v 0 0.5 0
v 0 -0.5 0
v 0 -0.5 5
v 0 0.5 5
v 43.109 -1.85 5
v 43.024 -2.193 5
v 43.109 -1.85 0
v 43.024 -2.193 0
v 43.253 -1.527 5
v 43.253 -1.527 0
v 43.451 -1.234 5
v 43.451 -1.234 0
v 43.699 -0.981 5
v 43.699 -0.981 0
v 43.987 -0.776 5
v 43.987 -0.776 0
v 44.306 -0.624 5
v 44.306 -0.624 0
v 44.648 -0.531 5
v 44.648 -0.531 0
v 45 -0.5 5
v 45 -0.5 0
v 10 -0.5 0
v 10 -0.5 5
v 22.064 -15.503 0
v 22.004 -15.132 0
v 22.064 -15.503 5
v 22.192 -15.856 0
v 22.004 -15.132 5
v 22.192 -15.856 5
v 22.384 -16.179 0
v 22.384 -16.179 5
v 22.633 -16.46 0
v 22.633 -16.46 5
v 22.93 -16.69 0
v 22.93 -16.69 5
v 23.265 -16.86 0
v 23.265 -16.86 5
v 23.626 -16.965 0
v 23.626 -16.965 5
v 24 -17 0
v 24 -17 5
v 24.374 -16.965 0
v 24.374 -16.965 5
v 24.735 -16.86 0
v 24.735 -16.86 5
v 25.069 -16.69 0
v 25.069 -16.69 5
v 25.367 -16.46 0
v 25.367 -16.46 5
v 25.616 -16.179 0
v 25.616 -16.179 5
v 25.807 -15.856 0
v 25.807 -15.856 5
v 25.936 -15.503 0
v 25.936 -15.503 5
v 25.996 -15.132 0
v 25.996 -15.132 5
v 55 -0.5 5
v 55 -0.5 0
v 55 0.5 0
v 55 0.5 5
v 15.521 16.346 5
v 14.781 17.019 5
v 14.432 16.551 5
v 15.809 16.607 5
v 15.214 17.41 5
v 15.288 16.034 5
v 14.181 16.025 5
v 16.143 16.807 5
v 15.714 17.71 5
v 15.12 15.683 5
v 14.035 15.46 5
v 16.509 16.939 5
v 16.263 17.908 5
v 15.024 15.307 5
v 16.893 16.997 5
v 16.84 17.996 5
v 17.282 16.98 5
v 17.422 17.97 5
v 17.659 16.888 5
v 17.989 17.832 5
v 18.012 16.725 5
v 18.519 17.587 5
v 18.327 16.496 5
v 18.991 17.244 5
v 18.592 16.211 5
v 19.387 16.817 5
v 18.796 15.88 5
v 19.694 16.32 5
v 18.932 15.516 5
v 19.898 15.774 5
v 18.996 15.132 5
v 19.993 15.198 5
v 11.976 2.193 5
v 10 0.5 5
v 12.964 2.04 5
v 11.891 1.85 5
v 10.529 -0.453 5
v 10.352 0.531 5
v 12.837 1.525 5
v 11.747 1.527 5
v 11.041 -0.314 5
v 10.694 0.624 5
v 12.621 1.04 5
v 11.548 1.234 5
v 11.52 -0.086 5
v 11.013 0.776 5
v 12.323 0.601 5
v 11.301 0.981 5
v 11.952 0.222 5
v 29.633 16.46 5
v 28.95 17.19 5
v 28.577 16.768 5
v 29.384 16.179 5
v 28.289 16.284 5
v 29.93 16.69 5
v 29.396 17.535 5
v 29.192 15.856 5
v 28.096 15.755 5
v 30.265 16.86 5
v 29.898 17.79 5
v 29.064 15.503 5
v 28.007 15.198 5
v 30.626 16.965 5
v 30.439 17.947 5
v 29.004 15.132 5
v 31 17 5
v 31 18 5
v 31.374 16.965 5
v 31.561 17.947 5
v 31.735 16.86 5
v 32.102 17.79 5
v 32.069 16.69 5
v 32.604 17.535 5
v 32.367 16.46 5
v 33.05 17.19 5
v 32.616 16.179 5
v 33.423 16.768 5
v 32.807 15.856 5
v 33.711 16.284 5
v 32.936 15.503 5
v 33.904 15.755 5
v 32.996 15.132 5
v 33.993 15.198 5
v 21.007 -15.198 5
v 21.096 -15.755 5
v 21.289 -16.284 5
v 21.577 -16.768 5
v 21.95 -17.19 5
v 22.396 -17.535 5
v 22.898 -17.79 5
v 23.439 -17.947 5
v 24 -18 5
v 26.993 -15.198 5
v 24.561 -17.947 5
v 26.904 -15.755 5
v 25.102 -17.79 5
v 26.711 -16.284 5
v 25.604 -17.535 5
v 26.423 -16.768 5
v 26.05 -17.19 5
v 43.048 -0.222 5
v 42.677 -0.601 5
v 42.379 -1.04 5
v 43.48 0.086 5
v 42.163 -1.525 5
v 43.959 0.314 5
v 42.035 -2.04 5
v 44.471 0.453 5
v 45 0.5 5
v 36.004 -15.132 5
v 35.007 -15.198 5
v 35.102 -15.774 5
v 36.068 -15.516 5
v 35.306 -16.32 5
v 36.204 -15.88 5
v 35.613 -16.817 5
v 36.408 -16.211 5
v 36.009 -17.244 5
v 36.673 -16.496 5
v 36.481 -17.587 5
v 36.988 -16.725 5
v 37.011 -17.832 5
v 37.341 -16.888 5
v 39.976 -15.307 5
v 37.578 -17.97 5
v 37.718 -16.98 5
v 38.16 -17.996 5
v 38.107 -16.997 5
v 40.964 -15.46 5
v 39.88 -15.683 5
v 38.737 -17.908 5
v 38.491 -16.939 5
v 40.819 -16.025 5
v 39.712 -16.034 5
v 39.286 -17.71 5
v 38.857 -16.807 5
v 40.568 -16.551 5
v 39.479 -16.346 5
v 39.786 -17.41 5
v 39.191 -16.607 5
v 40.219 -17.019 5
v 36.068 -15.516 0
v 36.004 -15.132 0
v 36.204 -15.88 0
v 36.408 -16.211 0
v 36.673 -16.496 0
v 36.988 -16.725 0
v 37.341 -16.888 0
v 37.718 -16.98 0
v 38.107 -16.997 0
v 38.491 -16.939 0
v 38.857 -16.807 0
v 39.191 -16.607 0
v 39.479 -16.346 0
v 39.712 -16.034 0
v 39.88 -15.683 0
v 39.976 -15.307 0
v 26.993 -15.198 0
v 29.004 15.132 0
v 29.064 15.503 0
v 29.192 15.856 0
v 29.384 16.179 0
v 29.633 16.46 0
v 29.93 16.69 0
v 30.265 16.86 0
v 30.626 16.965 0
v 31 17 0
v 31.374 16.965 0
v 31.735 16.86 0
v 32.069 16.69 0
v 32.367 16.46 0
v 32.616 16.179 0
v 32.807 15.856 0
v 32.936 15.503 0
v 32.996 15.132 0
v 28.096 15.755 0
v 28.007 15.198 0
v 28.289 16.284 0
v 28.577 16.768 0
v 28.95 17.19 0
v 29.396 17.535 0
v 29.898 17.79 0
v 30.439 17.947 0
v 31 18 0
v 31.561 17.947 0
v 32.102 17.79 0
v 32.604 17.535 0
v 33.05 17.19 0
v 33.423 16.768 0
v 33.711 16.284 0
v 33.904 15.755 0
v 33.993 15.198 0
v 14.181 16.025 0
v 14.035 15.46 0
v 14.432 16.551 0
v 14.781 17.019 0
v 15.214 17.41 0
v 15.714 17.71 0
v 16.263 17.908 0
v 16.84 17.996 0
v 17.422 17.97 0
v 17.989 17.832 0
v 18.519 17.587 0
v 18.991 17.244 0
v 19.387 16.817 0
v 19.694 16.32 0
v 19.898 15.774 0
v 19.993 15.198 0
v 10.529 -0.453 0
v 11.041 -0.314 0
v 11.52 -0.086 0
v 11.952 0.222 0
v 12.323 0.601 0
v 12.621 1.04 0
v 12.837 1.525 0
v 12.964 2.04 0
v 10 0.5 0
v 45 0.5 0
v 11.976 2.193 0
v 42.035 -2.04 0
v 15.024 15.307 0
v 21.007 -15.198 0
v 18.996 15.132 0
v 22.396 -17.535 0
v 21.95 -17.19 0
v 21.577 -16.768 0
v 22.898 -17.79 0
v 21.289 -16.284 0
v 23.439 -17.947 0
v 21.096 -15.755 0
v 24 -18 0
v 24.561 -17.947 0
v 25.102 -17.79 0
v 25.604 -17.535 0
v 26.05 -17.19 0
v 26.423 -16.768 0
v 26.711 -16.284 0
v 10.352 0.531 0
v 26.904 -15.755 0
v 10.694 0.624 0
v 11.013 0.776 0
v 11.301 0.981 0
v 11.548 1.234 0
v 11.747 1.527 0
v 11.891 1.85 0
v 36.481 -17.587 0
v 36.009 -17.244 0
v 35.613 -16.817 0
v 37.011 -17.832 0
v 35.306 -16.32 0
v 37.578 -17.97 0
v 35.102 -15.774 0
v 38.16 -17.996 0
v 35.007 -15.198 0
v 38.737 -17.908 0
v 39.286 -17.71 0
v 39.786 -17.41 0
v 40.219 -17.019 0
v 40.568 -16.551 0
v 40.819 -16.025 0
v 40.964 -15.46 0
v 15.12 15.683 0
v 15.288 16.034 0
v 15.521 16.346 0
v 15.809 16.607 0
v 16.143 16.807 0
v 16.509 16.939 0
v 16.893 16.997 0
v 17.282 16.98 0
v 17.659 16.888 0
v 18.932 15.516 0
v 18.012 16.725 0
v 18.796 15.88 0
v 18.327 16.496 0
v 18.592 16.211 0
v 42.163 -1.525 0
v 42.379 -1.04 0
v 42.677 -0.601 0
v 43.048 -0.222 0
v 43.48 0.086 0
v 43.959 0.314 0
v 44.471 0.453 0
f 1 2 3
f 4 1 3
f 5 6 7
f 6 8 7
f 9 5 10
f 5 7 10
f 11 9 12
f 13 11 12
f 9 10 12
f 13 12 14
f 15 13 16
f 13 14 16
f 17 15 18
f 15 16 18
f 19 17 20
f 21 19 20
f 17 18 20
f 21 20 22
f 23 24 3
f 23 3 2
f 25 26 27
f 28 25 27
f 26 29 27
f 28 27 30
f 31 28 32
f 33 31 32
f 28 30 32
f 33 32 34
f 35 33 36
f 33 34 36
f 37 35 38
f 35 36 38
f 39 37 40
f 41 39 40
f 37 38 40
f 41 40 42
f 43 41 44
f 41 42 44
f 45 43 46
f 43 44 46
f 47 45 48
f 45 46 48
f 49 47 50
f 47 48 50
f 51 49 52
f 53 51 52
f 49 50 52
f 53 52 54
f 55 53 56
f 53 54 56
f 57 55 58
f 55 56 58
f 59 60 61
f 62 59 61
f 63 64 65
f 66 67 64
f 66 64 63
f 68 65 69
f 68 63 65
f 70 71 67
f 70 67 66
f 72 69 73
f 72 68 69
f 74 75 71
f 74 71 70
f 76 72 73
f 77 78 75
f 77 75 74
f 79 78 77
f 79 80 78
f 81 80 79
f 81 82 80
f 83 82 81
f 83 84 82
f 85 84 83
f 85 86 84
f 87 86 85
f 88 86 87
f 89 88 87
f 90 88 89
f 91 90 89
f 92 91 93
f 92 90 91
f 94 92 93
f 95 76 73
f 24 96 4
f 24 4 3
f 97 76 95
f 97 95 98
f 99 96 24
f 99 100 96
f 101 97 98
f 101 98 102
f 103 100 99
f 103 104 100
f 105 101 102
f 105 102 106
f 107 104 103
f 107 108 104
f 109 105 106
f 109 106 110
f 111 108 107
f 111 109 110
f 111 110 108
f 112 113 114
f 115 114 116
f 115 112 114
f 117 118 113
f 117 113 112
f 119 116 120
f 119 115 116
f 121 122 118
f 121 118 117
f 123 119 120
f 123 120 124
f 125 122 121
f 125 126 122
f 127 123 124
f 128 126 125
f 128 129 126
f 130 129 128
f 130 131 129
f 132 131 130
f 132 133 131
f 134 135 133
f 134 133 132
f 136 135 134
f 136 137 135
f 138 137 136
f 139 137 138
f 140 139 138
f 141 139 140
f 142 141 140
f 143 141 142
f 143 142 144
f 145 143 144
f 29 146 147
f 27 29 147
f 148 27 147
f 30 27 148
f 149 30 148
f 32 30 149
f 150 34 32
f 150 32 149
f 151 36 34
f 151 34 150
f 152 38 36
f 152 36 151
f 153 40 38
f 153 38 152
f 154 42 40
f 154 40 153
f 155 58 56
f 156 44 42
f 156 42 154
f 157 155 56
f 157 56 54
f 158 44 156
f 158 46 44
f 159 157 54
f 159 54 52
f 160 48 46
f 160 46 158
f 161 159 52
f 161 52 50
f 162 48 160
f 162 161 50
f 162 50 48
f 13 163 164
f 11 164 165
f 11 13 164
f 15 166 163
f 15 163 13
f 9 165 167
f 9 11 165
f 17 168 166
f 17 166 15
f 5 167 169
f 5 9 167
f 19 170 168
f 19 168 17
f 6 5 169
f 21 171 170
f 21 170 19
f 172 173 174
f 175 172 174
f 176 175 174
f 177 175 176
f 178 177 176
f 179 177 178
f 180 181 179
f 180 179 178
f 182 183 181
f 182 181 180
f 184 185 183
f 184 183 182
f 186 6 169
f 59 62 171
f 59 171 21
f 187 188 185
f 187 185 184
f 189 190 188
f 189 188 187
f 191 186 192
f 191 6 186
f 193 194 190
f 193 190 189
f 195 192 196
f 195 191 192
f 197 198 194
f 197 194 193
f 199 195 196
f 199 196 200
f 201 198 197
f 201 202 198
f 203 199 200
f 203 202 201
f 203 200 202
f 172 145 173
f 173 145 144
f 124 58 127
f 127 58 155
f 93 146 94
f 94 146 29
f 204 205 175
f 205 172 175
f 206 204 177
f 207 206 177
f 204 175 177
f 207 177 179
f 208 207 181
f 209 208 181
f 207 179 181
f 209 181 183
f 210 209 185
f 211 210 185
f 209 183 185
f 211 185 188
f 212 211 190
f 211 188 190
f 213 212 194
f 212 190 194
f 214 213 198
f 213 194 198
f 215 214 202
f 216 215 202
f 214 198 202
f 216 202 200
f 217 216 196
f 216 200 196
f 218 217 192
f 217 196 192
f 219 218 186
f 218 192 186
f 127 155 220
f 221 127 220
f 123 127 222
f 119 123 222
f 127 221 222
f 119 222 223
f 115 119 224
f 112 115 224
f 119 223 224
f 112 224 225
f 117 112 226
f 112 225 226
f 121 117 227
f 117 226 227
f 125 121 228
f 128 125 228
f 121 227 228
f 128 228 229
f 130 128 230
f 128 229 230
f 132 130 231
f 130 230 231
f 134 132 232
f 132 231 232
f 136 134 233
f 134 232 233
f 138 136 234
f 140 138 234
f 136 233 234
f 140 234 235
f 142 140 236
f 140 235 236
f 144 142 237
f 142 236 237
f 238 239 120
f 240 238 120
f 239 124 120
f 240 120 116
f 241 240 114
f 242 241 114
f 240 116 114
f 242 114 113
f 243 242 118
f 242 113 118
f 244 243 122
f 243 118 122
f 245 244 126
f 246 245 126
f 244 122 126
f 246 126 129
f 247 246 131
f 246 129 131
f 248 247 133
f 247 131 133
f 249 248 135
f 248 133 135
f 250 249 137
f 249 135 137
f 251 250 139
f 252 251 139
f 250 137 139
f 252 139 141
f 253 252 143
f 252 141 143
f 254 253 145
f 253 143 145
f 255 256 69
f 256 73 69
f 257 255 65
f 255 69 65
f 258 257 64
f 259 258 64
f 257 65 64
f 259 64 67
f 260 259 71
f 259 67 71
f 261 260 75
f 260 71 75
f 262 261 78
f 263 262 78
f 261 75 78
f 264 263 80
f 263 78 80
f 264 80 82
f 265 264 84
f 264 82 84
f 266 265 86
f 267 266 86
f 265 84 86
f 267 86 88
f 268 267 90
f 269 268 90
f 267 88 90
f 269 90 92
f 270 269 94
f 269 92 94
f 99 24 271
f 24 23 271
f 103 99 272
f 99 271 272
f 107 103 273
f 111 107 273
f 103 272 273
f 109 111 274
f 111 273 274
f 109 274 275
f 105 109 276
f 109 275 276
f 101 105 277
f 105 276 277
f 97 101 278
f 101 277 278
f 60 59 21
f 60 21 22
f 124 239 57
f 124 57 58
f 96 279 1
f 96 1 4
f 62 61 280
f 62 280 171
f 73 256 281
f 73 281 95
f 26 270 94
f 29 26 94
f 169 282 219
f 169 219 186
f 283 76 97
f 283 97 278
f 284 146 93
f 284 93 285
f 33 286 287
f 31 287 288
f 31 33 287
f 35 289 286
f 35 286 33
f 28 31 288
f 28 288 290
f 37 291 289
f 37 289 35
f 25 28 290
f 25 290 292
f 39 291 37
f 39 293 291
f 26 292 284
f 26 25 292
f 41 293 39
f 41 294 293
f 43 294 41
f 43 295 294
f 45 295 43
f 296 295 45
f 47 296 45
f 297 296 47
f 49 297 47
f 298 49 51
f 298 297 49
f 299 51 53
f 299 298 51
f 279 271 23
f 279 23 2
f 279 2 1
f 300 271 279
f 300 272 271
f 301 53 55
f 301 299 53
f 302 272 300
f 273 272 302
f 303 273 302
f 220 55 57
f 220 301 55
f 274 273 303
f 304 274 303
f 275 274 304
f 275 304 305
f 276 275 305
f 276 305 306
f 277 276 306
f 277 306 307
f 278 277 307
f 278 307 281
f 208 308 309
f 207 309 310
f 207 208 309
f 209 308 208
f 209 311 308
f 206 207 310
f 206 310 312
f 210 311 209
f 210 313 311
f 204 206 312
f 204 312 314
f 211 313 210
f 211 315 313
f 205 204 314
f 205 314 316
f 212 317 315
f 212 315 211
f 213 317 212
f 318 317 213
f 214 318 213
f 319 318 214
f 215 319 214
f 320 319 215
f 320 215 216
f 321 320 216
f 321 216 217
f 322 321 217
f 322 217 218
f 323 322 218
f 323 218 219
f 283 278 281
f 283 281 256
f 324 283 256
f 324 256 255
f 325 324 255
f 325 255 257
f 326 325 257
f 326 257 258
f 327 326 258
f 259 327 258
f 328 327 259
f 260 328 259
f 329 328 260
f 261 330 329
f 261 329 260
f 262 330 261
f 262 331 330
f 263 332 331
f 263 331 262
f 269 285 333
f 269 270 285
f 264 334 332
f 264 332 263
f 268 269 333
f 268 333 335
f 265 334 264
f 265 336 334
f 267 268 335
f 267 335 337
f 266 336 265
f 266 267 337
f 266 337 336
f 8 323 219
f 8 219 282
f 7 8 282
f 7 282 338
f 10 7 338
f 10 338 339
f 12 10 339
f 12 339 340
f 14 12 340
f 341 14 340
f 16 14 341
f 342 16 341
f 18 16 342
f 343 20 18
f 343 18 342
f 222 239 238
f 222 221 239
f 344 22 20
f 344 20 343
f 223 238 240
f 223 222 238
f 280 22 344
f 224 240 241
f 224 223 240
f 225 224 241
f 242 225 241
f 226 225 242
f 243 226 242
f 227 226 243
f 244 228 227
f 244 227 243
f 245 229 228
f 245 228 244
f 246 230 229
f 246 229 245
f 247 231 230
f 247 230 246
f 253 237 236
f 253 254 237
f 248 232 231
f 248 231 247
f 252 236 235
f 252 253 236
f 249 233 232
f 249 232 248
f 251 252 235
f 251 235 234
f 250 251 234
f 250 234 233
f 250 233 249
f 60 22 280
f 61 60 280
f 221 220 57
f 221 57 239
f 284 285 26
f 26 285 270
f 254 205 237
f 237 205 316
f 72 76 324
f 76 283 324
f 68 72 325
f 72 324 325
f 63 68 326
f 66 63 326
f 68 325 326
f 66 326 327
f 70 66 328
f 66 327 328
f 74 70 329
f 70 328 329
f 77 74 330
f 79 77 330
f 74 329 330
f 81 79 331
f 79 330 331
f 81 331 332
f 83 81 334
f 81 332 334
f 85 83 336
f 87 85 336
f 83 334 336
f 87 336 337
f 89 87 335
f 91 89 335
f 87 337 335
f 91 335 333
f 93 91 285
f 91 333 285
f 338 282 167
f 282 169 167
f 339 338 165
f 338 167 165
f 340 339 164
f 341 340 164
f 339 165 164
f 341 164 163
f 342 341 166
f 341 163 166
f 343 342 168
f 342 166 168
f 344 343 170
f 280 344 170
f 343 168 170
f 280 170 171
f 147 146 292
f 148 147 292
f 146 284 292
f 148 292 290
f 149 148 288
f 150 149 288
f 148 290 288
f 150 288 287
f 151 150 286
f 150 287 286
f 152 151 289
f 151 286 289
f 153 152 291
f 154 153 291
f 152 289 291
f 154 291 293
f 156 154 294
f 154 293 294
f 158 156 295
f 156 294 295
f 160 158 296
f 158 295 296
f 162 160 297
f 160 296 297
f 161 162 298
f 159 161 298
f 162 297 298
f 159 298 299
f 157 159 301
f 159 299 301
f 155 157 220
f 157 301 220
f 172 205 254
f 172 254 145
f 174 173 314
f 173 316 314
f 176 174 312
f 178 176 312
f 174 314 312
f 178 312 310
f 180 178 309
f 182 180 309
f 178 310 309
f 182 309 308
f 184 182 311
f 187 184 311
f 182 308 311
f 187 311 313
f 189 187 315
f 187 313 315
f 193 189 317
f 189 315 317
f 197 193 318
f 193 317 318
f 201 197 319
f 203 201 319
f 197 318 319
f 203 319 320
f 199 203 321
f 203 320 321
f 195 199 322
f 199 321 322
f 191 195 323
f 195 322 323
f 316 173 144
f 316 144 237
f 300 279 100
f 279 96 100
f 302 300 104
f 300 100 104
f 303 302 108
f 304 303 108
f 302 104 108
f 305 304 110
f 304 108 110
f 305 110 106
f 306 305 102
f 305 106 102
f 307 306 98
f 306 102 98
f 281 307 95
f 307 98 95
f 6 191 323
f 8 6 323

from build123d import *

# Parameters (mm, degrees)
SKETCH_W = 1
SKETCH_H = 5


with BuildPart() as part:
    # AdditivePipe: sweep along a path in Sketch001
    with BuildLine(Plane.XY) as additivepipe_path:
        Line((0, 0), (10, 0))
        ThreePointArc((10, 0), (11.62655, 0.60151), (12.470399, 2.116567))
        Line((12.470399, 2.116567), (14.529557, 15.383433))
        ThreePointArc((14.529557, 15.383433), (17.109663, 17.497593), (19.494501, 15.16539))
        Line((19.494501, 15.16539), (21.505454, -15.165388))
        ThreePointArc((21.505454, -15.165388), (23.999977, -17.5), (26.494501, -15.165389))
        Line((26.494501, -15.165389), (28.505454, 15.165389))
        ThreePointArc((28.505454, 15.165389), (30.999978, 17.5), (33.494501, 15.165388))
        Line((33.494501, 15.165388), (35.505455, -15.16539))
        ThreePointArc((35.505455, -15.16539), (37.890292, -17.497593), (40.470399, -15.383433))
        Line((40.470399, -15.383433), (42.529557, -2.116567))
        ThreePointArc((42.529557, -2.116567), (43.373406, -0.60151), (44.999956, 0))
        Line((44.999956, 0), (54.999956, 0))
    # Sketch → AdditivePipe (sweep)
    with BuildSketch(Plane.YZ):
        with Locations((0, 2.5)):
            Rectangle(SKETCH_W, SKETCH_H)
    sweep(path=additivepipe_path.line)


solid = part.part
